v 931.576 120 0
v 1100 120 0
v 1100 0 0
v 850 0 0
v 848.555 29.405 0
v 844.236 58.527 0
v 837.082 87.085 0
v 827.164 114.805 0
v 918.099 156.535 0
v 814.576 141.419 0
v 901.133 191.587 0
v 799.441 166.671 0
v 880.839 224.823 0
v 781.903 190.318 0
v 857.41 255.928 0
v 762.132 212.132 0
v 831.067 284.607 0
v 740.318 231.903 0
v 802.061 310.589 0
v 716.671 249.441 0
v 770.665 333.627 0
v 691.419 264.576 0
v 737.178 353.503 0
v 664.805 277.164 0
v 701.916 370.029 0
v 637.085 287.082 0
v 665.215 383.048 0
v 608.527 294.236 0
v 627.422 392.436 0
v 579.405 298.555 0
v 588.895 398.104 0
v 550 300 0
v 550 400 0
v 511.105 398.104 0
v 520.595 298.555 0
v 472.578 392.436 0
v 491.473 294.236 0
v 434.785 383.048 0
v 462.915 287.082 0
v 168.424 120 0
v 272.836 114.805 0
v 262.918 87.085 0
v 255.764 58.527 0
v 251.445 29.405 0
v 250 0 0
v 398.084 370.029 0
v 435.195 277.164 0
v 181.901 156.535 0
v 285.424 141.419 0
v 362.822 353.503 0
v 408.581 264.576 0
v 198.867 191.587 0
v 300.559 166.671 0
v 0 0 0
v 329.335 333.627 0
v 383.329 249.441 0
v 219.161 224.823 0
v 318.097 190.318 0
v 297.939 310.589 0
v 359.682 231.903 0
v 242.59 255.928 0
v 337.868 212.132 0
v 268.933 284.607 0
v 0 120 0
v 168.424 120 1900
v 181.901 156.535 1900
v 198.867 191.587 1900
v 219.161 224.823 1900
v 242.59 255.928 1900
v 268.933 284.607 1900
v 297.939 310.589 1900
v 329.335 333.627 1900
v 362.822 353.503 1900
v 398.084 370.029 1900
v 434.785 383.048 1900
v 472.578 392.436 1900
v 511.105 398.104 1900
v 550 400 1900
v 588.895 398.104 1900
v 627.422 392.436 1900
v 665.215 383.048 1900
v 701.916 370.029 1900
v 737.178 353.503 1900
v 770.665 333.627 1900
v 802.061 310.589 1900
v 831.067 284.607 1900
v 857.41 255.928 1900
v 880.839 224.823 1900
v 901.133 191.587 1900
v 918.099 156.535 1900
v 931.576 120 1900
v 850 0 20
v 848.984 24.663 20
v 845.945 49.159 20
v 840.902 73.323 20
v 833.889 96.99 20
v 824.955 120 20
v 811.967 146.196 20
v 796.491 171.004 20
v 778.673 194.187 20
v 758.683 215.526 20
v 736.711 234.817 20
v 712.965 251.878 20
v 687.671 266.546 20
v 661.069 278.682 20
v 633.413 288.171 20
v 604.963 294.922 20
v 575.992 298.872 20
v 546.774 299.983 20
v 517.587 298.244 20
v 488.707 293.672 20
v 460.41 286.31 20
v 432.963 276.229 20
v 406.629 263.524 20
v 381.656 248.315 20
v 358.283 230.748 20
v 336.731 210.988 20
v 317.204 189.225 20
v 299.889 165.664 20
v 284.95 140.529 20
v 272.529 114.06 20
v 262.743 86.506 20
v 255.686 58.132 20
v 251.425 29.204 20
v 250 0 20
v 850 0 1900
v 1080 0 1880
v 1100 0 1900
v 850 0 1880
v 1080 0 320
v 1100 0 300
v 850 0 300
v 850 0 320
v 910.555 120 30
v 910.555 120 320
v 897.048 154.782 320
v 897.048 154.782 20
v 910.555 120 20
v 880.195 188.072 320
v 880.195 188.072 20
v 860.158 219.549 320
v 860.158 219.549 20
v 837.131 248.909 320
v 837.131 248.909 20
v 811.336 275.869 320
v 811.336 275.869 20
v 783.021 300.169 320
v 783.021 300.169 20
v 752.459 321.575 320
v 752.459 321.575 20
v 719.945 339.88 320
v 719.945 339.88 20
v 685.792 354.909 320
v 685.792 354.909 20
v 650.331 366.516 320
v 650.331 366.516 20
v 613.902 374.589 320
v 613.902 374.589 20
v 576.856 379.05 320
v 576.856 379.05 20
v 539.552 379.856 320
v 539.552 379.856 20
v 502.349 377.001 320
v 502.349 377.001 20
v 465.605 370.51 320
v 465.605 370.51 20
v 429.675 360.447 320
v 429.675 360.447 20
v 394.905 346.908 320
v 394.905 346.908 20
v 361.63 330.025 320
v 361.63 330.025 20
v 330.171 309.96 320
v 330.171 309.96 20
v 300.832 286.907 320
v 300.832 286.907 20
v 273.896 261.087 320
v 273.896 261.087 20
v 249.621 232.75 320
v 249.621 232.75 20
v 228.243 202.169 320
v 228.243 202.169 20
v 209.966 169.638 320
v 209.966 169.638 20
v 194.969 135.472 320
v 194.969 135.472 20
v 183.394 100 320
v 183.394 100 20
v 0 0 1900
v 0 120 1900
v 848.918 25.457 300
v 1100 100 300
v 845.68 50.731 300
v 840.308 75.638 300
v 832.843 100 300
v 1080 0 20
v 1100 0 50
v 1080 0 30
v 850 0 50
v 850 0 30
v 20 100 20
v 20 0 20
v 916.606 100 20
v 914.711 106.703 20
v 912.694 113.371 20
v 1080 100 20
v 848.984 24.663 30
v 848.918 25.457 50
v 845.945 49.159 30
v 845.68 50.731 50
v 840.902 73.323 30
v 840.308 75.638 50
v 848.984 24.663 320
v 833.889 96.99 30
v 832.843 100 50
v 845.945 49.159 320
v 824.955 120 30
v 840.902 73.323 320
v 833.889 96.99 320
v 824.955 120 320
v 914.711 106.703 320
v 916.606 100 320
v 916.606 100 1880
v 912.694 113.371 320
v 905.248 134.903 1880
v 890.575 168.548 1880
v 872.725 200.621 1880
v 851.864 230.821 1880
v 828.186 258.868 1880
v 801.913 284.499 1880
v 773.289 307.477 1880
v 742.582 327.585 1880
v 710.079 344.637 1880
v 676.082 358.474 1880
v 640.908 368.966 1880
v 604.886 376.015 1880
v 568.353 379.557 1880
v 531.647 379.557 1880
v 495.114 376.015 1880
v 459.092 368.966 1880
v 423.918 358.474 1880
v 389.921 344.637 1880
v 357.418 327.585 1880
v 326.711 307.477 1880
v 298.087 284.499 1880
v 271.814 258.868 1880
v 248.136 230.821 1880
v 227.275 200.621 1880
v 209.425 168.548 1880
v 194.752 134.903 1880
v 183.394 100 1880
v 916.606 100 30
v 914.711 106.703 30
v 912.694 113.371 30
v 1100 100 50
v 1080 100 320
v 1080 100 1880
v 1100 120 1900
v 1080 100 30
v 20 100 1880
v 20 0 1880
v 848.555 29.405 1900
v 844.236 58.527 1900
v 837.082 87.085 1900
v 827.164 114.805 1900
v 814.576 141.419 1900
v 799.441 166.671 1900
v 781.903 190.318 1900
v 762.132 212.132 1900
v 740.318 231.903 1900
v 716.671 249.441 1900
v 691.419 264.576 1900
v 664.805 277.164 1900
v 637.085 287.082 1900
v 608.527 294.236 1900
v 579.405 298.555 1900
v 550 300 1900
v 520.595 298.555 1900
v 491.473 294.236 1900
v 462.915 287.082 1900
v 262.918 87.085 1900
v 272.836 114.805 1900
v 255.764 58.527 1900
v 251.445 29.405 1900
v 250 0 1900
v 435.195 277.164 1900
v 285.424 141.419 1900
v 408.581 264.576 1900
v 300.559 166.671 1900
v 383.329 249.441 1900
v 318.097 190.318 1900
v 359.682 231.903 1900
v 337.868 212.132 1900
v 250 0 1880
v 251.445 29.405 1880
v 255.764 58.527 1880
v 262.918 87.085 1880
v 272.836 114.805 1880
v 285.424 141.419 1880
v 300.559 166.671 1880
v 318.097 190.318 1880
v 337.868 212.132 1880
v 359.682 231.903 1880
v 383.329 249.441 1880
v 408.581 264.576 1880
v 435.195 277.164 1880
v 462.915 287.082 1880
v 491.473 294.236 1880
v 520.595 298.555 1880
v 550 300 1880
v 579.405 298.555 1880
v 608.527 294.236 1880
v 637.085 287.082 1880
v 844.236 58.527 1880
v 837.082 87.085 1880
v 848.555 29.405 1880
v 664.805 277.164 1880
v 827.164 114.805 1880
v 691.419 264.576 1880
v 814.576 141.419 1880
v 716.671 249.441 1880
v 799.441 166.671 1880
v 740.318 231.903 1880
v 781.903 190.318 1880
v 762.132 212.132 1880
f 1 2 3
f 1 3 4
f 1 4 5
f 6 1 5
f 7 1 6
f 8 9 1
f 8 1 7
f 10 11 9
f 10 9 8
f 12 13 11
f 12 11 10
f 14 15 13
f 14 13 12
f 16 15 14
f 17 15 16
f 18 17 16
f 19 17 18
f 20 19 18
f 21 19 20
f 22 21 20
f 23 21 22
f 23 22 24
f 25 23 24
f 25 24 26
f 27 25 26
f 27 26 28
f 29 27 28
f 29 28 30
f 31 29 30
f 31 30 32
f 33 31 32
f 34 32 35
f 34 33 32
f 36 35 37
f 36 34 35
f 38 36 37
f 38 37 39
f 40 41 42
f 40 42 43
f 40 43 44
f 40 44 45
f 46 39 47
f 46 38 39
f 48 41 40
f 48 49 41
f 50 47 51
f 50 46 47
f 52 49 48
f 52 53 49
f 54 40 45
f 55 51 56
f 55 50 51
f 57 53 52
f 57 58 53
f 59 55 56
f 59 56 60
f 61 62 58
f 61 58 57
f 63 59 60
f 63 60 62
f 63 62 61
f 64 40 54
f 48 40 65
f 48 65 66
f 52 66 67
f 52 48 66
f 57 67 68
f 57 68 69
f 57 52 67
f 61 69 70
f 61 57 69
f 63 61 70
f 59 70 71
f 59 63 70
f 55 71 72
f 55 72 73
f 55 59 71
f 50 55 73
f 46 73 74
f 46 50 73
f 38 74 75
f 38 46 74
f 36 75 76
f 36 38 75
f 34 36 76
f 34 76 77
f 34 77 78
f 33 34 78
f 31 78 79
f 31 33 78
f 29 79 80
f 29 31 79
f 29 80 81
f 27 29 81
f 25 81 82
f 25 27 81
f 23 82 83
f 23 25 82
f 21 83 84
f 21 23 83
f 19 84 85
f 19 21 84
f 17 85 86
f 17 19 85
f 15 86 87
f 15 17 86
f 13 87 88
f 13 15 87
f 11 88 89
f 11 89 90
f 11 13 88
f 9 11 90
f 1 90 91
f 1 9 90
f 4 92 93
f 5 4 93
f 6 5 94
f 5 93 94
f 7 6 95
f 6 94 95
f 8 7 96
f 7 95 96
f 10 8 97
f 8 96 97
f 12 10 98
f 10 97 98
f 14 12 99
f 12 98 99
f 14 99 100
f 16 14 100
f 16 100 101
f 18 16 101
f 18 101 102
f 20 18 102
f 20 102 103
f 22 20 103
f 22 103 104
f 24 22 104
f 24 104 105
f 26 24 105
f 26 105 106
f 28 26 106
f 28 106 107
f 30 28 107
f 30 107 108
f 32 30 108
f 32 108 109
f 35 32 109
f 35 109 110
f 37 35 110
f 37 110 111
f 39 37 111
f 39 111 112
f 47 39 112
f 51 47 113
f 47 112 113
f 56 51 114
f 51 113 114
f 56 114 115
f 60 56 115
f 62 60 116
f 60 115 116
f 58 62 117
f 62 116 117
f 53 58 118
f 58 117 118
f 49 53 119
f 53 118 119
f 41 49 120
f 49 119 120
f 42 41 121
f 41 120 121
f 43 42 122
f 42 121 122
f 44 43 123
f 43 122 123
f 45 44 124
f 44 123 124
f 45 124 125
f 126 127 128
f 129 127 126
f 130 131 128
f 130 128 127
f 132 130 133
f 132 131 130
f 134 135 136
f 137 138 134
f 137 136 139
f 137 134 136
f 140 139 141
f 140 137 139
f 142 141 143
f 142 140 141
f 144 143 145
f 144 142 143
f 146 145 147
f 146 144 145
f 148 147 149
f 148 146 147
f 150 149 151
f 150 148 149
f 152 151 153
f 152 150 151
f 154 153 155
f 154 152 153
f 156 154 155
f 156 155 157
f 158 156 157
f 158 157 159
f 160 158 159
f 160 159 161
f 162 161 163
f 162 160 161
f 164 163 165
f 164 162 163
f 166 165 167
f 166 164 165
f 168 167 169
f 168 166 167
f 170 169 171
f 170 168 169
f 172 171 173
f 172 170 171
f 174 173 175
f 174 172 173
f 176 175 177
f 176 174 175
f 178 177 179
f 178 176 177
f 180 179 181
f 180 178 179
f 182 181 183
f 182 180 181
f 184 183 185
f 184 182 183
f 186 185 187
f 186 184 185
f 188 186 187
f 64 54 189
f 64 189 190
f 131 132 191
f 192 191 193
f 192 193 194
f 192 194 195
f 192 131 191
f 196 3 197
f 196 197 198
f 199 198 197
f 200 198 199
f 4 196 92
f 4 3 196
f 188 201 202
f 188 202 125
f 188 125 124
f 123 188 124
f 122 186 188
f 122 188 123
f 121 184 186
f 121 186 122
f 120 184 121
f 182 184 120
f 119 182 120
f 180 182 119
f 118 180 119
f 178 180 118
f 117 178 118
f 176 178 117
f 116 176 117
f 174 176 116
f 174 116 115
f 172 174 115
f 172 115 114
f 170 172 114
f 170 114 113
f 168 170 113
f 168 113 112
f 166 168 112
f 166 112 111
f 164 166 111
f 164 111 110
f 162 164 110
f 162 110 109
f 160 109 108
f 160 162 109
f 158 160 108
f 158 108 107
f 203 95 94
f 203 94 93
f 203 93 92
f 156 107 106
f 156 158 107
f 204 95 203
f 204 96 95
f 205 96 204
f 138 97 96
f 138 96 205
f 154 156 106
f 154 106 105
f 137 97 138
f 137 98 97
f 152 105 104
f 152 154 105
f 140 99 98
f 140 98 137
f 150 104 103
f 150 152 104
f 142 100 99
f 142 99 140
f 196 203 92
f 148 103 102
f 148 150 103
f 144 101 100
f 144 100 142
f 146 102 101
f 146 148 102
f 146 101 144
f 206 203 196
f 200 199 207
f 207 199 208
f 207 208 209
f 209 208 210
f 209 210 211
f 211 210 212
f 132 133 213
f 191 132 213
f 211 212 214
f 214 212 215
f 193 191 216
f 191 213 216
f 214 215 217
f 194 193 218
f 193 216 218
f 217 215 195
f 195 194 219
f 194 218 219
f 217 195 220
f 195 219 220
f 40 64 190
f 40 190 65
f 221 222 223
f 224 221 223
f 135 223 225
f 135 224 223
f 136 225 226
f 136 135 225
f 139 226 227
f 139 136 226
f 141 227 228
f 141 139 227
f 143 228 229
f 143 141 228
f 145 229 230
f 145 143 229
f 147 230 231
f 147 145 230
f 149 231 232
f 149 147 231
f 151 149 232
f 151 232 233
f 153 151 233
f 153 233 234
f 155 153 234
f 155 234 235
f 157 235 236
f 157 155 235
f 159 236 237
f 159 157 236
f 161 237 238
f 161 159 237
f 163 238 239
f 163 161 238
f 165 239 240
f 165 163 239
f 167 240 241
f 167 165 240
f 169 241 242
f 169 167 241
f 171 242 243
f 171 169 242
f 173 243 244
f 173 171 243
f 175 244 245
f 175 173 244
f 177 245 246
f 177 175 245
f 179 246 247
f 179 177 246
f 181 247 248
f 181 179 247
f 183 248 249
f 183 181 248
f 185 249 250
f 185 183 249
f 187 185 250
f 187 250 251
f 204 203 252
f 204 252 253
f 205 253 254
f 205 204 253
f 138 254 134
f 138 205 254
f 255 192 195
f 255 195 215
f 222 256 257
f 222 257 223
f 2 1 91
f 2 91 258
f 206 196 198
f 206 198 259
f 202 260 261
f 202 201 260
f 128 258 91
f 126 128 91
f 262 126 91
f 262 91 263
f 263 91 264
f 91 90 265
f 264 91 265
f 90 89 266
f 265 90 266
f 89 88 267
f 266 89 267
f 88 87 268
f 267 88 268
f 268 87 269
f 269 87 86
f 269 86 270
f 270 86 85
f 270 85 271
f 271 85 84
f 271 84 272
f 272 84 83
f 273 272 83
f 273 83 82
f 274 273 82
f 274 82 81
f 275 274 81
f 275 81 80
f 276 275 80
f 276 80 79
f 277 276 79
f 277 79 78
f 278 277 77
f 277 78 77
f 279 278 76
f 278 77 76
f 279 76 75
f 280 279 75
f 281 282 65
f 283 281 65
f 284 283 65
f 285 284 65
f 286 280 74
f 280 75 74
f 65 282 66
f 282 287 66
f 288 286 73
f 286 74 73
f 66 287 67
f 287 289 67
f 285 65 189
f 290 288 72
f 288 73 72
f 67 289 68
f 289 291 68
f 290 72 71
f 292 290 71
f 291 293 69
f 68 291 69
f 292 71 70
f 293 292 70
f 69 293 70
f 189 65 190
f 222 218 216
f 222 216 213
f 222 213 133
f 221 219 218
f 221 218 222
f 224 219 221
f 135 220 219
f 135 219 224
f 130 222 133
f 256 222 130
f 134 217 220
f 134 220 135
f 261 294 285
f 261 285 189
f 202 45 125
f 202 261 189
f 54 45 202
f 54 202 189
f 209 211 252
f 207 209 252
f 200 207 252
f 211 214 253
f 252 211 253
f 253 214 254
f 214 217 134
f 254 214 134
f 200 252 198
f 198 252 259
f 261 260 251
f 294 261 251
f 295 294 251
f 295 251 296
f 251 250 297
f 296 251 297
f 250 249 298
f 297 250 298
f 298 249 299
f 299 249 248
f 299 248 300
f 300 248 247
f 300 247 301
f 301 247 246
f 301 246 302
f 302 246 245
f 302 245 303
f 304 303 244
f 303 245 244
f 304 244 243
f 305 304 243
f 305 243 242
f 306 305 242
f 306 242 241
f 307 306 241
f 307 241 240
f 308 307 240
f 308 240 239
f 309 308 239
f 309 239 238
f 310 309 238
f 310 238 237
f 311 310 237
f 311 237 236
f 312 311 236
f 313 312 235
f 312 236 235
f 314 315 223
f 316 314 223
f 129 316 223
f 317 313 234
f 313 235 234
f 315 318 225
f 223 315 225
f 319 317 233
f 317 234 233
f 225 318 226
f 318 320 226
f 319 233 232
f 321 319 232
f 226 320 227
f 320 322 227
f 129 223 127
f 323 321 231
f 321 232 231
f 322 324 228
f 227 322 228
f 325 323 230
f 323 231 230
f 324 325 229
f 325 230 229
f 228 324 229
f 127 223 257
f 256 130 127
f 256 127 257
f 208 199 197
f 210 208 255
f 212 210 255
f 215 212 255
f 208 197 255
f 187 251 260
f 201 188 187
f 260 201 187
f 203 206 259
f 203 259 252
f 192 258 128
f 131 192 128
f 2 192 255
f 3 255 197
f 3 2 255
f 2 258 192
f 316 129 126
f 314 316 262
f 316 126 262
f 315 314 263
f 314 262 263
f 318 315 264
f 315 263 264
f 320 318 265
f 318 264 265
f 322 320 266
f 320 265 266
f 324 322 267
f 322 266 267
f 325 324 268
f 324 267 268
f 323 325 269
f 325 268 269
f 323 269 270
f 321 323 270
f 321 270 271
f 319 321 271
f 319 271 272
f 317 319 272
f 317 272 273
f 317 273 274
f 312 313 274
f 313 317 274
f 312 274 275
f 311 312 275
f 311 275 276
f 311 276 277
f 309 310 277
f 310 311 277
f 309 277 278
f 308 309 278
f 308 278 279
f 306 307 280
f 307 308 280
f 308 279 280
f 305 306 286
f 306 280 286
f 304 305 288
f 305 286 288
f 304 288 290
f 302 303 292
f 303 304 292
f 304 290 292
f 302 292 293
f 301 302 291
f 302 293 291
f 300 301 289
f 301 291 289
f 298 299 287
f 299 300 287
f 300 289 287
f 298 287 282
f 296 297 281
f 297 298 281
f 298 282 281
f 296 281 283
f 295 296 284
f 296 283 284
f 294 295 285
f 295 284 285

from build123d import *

# Parameters (mm, degrees)
BOSS_EXTRUDE1_DEPTH = 1900
SKETCH2_R           = 300
CUT_EXTRUDE1_DEPTH  = 2232.591360442
SKETCH4_W           = 250
SKETCH4_H           = 100
CUT_EXTRUDE3_DEPTH  = 550
SHELL1_START        = 320
SHELL1_DEPTH        = 1560
SHELL1_START_2      = 20
SHELL1_2_DEPTH      = 300
SHELL1_3_DEPTH      = 10


# Read off the part's stored shape, not the designer's step: Shell1
with BuildPart() as part:
    # Sketch1 → Boss-Extrude1 (new body)
    with BuildSketch(Plane.XY):
        with BuildLine():
            Line((931.575680567, 120), (1100, 120))
            Line((1100, 120), (1100, 0))
            Line((1100, 0), (0, 0))
            Line((0, 0), (0, 120))
            Line((0, 120), (168.424319433, 120))
            ThreePointArc((168.424319433, 120), (550, 400), (931.575680567, 120))
        make_face()
    extrude(amount=BOSS_EXTRUDE1_DEPTH)

    # Sketch2 → Cut-Extrude1 (cut, through all)
    with BuildSketch(Plane.XY.offset(1900)):
        with Locations((550, 0)):
            Circle(SKETCH2_R)
    extrude(amount=-CUT_EXTRUDE1_DEPTH, mode=Mode.SUBTRACT)

    # Sketch4 → Cut-Extrude3 (cut)
    with BuildSketch(Plane(origin=(1100, 0, 0), x_dir=(0, 0, -1), z_dir=(1, 0, 0))):
        with Locations((-175, 50)):
            Rectangle(SKETCH4_W, SKETCH4_H)
    extrude(amount=-CUT_EXTRUDE3_DEPTH, mode=Mode.SUBTRACT)

    # Shell1 outline → Shell1 (cut)
    with BuildSketch(Plane.XY.offset(SHELL1_START)):
        with BuildLine():
            ThreePointArc((916.606055596, 100), (550, 380), (183.393944404, 100))
            Line((183.393944404, 100), (20, 100))
            Line((20, 100), (20, 0))
            Line((20, 0), (250, 0))
            ThreePointArc((250, 0), (550, 300), (850, 0))
            Line((850, 0), (1080, 0))
            Line((1080, 0), (1080, 100))
            Line((1080, 100), (916.606055596, 100))
        make_face()
    extrude(amount=SHELL1_DEPTH, mode=Mode.SUBTRACT)

    # Shell1 2 outline → Shell1 2 (cut)
    with BuildSketch(Plane.XY.offset(SHELL1_START_2)):
        with BuildLine():
            Line((824.954541697, 120), (910.555127546, 120))
            ThreePointArc((910.555127546, 120), (539.552347988, 379.856349911), (183.393944404, 100))
            Line((183.393944404, 100), (20, 100))
            Line((20, 100), (20, 0))
            Line((20, 0), (250, 0))
            ThreePointArc((250, 0), (488.707106893, 293.671893879), (824.954541697, 120))
        make_face()
    extrude(amount=SHELL1_2_DEPTH, mode=Mode.SUBTRACT)

    # Shell1 3 outline → Shell1 3 (cut)
    with BuildSketch(Plane.XY.offset(SHELL1_START_2)):
        with BuildLine():
            ThreePointArc((916.606055596, 100), (913.718086665, 110.041598646), (910.555127546, 120))
            Line((910.555127546, 120), (824.954541697, 120))
            ThreePointArc((824.954541697, 120), (843.671893879, 61.292893107), (850, 0))
            Line((850, 0), (1080, 0))
            Line((1080, 0), (1080, 100))
            Line((1080, 100), (916.606055596, 100))
        make_face()
    extrude(amount=SHELL1_3_DEPTH, mode=Mode.SUBTRACT)


solid = part.part
